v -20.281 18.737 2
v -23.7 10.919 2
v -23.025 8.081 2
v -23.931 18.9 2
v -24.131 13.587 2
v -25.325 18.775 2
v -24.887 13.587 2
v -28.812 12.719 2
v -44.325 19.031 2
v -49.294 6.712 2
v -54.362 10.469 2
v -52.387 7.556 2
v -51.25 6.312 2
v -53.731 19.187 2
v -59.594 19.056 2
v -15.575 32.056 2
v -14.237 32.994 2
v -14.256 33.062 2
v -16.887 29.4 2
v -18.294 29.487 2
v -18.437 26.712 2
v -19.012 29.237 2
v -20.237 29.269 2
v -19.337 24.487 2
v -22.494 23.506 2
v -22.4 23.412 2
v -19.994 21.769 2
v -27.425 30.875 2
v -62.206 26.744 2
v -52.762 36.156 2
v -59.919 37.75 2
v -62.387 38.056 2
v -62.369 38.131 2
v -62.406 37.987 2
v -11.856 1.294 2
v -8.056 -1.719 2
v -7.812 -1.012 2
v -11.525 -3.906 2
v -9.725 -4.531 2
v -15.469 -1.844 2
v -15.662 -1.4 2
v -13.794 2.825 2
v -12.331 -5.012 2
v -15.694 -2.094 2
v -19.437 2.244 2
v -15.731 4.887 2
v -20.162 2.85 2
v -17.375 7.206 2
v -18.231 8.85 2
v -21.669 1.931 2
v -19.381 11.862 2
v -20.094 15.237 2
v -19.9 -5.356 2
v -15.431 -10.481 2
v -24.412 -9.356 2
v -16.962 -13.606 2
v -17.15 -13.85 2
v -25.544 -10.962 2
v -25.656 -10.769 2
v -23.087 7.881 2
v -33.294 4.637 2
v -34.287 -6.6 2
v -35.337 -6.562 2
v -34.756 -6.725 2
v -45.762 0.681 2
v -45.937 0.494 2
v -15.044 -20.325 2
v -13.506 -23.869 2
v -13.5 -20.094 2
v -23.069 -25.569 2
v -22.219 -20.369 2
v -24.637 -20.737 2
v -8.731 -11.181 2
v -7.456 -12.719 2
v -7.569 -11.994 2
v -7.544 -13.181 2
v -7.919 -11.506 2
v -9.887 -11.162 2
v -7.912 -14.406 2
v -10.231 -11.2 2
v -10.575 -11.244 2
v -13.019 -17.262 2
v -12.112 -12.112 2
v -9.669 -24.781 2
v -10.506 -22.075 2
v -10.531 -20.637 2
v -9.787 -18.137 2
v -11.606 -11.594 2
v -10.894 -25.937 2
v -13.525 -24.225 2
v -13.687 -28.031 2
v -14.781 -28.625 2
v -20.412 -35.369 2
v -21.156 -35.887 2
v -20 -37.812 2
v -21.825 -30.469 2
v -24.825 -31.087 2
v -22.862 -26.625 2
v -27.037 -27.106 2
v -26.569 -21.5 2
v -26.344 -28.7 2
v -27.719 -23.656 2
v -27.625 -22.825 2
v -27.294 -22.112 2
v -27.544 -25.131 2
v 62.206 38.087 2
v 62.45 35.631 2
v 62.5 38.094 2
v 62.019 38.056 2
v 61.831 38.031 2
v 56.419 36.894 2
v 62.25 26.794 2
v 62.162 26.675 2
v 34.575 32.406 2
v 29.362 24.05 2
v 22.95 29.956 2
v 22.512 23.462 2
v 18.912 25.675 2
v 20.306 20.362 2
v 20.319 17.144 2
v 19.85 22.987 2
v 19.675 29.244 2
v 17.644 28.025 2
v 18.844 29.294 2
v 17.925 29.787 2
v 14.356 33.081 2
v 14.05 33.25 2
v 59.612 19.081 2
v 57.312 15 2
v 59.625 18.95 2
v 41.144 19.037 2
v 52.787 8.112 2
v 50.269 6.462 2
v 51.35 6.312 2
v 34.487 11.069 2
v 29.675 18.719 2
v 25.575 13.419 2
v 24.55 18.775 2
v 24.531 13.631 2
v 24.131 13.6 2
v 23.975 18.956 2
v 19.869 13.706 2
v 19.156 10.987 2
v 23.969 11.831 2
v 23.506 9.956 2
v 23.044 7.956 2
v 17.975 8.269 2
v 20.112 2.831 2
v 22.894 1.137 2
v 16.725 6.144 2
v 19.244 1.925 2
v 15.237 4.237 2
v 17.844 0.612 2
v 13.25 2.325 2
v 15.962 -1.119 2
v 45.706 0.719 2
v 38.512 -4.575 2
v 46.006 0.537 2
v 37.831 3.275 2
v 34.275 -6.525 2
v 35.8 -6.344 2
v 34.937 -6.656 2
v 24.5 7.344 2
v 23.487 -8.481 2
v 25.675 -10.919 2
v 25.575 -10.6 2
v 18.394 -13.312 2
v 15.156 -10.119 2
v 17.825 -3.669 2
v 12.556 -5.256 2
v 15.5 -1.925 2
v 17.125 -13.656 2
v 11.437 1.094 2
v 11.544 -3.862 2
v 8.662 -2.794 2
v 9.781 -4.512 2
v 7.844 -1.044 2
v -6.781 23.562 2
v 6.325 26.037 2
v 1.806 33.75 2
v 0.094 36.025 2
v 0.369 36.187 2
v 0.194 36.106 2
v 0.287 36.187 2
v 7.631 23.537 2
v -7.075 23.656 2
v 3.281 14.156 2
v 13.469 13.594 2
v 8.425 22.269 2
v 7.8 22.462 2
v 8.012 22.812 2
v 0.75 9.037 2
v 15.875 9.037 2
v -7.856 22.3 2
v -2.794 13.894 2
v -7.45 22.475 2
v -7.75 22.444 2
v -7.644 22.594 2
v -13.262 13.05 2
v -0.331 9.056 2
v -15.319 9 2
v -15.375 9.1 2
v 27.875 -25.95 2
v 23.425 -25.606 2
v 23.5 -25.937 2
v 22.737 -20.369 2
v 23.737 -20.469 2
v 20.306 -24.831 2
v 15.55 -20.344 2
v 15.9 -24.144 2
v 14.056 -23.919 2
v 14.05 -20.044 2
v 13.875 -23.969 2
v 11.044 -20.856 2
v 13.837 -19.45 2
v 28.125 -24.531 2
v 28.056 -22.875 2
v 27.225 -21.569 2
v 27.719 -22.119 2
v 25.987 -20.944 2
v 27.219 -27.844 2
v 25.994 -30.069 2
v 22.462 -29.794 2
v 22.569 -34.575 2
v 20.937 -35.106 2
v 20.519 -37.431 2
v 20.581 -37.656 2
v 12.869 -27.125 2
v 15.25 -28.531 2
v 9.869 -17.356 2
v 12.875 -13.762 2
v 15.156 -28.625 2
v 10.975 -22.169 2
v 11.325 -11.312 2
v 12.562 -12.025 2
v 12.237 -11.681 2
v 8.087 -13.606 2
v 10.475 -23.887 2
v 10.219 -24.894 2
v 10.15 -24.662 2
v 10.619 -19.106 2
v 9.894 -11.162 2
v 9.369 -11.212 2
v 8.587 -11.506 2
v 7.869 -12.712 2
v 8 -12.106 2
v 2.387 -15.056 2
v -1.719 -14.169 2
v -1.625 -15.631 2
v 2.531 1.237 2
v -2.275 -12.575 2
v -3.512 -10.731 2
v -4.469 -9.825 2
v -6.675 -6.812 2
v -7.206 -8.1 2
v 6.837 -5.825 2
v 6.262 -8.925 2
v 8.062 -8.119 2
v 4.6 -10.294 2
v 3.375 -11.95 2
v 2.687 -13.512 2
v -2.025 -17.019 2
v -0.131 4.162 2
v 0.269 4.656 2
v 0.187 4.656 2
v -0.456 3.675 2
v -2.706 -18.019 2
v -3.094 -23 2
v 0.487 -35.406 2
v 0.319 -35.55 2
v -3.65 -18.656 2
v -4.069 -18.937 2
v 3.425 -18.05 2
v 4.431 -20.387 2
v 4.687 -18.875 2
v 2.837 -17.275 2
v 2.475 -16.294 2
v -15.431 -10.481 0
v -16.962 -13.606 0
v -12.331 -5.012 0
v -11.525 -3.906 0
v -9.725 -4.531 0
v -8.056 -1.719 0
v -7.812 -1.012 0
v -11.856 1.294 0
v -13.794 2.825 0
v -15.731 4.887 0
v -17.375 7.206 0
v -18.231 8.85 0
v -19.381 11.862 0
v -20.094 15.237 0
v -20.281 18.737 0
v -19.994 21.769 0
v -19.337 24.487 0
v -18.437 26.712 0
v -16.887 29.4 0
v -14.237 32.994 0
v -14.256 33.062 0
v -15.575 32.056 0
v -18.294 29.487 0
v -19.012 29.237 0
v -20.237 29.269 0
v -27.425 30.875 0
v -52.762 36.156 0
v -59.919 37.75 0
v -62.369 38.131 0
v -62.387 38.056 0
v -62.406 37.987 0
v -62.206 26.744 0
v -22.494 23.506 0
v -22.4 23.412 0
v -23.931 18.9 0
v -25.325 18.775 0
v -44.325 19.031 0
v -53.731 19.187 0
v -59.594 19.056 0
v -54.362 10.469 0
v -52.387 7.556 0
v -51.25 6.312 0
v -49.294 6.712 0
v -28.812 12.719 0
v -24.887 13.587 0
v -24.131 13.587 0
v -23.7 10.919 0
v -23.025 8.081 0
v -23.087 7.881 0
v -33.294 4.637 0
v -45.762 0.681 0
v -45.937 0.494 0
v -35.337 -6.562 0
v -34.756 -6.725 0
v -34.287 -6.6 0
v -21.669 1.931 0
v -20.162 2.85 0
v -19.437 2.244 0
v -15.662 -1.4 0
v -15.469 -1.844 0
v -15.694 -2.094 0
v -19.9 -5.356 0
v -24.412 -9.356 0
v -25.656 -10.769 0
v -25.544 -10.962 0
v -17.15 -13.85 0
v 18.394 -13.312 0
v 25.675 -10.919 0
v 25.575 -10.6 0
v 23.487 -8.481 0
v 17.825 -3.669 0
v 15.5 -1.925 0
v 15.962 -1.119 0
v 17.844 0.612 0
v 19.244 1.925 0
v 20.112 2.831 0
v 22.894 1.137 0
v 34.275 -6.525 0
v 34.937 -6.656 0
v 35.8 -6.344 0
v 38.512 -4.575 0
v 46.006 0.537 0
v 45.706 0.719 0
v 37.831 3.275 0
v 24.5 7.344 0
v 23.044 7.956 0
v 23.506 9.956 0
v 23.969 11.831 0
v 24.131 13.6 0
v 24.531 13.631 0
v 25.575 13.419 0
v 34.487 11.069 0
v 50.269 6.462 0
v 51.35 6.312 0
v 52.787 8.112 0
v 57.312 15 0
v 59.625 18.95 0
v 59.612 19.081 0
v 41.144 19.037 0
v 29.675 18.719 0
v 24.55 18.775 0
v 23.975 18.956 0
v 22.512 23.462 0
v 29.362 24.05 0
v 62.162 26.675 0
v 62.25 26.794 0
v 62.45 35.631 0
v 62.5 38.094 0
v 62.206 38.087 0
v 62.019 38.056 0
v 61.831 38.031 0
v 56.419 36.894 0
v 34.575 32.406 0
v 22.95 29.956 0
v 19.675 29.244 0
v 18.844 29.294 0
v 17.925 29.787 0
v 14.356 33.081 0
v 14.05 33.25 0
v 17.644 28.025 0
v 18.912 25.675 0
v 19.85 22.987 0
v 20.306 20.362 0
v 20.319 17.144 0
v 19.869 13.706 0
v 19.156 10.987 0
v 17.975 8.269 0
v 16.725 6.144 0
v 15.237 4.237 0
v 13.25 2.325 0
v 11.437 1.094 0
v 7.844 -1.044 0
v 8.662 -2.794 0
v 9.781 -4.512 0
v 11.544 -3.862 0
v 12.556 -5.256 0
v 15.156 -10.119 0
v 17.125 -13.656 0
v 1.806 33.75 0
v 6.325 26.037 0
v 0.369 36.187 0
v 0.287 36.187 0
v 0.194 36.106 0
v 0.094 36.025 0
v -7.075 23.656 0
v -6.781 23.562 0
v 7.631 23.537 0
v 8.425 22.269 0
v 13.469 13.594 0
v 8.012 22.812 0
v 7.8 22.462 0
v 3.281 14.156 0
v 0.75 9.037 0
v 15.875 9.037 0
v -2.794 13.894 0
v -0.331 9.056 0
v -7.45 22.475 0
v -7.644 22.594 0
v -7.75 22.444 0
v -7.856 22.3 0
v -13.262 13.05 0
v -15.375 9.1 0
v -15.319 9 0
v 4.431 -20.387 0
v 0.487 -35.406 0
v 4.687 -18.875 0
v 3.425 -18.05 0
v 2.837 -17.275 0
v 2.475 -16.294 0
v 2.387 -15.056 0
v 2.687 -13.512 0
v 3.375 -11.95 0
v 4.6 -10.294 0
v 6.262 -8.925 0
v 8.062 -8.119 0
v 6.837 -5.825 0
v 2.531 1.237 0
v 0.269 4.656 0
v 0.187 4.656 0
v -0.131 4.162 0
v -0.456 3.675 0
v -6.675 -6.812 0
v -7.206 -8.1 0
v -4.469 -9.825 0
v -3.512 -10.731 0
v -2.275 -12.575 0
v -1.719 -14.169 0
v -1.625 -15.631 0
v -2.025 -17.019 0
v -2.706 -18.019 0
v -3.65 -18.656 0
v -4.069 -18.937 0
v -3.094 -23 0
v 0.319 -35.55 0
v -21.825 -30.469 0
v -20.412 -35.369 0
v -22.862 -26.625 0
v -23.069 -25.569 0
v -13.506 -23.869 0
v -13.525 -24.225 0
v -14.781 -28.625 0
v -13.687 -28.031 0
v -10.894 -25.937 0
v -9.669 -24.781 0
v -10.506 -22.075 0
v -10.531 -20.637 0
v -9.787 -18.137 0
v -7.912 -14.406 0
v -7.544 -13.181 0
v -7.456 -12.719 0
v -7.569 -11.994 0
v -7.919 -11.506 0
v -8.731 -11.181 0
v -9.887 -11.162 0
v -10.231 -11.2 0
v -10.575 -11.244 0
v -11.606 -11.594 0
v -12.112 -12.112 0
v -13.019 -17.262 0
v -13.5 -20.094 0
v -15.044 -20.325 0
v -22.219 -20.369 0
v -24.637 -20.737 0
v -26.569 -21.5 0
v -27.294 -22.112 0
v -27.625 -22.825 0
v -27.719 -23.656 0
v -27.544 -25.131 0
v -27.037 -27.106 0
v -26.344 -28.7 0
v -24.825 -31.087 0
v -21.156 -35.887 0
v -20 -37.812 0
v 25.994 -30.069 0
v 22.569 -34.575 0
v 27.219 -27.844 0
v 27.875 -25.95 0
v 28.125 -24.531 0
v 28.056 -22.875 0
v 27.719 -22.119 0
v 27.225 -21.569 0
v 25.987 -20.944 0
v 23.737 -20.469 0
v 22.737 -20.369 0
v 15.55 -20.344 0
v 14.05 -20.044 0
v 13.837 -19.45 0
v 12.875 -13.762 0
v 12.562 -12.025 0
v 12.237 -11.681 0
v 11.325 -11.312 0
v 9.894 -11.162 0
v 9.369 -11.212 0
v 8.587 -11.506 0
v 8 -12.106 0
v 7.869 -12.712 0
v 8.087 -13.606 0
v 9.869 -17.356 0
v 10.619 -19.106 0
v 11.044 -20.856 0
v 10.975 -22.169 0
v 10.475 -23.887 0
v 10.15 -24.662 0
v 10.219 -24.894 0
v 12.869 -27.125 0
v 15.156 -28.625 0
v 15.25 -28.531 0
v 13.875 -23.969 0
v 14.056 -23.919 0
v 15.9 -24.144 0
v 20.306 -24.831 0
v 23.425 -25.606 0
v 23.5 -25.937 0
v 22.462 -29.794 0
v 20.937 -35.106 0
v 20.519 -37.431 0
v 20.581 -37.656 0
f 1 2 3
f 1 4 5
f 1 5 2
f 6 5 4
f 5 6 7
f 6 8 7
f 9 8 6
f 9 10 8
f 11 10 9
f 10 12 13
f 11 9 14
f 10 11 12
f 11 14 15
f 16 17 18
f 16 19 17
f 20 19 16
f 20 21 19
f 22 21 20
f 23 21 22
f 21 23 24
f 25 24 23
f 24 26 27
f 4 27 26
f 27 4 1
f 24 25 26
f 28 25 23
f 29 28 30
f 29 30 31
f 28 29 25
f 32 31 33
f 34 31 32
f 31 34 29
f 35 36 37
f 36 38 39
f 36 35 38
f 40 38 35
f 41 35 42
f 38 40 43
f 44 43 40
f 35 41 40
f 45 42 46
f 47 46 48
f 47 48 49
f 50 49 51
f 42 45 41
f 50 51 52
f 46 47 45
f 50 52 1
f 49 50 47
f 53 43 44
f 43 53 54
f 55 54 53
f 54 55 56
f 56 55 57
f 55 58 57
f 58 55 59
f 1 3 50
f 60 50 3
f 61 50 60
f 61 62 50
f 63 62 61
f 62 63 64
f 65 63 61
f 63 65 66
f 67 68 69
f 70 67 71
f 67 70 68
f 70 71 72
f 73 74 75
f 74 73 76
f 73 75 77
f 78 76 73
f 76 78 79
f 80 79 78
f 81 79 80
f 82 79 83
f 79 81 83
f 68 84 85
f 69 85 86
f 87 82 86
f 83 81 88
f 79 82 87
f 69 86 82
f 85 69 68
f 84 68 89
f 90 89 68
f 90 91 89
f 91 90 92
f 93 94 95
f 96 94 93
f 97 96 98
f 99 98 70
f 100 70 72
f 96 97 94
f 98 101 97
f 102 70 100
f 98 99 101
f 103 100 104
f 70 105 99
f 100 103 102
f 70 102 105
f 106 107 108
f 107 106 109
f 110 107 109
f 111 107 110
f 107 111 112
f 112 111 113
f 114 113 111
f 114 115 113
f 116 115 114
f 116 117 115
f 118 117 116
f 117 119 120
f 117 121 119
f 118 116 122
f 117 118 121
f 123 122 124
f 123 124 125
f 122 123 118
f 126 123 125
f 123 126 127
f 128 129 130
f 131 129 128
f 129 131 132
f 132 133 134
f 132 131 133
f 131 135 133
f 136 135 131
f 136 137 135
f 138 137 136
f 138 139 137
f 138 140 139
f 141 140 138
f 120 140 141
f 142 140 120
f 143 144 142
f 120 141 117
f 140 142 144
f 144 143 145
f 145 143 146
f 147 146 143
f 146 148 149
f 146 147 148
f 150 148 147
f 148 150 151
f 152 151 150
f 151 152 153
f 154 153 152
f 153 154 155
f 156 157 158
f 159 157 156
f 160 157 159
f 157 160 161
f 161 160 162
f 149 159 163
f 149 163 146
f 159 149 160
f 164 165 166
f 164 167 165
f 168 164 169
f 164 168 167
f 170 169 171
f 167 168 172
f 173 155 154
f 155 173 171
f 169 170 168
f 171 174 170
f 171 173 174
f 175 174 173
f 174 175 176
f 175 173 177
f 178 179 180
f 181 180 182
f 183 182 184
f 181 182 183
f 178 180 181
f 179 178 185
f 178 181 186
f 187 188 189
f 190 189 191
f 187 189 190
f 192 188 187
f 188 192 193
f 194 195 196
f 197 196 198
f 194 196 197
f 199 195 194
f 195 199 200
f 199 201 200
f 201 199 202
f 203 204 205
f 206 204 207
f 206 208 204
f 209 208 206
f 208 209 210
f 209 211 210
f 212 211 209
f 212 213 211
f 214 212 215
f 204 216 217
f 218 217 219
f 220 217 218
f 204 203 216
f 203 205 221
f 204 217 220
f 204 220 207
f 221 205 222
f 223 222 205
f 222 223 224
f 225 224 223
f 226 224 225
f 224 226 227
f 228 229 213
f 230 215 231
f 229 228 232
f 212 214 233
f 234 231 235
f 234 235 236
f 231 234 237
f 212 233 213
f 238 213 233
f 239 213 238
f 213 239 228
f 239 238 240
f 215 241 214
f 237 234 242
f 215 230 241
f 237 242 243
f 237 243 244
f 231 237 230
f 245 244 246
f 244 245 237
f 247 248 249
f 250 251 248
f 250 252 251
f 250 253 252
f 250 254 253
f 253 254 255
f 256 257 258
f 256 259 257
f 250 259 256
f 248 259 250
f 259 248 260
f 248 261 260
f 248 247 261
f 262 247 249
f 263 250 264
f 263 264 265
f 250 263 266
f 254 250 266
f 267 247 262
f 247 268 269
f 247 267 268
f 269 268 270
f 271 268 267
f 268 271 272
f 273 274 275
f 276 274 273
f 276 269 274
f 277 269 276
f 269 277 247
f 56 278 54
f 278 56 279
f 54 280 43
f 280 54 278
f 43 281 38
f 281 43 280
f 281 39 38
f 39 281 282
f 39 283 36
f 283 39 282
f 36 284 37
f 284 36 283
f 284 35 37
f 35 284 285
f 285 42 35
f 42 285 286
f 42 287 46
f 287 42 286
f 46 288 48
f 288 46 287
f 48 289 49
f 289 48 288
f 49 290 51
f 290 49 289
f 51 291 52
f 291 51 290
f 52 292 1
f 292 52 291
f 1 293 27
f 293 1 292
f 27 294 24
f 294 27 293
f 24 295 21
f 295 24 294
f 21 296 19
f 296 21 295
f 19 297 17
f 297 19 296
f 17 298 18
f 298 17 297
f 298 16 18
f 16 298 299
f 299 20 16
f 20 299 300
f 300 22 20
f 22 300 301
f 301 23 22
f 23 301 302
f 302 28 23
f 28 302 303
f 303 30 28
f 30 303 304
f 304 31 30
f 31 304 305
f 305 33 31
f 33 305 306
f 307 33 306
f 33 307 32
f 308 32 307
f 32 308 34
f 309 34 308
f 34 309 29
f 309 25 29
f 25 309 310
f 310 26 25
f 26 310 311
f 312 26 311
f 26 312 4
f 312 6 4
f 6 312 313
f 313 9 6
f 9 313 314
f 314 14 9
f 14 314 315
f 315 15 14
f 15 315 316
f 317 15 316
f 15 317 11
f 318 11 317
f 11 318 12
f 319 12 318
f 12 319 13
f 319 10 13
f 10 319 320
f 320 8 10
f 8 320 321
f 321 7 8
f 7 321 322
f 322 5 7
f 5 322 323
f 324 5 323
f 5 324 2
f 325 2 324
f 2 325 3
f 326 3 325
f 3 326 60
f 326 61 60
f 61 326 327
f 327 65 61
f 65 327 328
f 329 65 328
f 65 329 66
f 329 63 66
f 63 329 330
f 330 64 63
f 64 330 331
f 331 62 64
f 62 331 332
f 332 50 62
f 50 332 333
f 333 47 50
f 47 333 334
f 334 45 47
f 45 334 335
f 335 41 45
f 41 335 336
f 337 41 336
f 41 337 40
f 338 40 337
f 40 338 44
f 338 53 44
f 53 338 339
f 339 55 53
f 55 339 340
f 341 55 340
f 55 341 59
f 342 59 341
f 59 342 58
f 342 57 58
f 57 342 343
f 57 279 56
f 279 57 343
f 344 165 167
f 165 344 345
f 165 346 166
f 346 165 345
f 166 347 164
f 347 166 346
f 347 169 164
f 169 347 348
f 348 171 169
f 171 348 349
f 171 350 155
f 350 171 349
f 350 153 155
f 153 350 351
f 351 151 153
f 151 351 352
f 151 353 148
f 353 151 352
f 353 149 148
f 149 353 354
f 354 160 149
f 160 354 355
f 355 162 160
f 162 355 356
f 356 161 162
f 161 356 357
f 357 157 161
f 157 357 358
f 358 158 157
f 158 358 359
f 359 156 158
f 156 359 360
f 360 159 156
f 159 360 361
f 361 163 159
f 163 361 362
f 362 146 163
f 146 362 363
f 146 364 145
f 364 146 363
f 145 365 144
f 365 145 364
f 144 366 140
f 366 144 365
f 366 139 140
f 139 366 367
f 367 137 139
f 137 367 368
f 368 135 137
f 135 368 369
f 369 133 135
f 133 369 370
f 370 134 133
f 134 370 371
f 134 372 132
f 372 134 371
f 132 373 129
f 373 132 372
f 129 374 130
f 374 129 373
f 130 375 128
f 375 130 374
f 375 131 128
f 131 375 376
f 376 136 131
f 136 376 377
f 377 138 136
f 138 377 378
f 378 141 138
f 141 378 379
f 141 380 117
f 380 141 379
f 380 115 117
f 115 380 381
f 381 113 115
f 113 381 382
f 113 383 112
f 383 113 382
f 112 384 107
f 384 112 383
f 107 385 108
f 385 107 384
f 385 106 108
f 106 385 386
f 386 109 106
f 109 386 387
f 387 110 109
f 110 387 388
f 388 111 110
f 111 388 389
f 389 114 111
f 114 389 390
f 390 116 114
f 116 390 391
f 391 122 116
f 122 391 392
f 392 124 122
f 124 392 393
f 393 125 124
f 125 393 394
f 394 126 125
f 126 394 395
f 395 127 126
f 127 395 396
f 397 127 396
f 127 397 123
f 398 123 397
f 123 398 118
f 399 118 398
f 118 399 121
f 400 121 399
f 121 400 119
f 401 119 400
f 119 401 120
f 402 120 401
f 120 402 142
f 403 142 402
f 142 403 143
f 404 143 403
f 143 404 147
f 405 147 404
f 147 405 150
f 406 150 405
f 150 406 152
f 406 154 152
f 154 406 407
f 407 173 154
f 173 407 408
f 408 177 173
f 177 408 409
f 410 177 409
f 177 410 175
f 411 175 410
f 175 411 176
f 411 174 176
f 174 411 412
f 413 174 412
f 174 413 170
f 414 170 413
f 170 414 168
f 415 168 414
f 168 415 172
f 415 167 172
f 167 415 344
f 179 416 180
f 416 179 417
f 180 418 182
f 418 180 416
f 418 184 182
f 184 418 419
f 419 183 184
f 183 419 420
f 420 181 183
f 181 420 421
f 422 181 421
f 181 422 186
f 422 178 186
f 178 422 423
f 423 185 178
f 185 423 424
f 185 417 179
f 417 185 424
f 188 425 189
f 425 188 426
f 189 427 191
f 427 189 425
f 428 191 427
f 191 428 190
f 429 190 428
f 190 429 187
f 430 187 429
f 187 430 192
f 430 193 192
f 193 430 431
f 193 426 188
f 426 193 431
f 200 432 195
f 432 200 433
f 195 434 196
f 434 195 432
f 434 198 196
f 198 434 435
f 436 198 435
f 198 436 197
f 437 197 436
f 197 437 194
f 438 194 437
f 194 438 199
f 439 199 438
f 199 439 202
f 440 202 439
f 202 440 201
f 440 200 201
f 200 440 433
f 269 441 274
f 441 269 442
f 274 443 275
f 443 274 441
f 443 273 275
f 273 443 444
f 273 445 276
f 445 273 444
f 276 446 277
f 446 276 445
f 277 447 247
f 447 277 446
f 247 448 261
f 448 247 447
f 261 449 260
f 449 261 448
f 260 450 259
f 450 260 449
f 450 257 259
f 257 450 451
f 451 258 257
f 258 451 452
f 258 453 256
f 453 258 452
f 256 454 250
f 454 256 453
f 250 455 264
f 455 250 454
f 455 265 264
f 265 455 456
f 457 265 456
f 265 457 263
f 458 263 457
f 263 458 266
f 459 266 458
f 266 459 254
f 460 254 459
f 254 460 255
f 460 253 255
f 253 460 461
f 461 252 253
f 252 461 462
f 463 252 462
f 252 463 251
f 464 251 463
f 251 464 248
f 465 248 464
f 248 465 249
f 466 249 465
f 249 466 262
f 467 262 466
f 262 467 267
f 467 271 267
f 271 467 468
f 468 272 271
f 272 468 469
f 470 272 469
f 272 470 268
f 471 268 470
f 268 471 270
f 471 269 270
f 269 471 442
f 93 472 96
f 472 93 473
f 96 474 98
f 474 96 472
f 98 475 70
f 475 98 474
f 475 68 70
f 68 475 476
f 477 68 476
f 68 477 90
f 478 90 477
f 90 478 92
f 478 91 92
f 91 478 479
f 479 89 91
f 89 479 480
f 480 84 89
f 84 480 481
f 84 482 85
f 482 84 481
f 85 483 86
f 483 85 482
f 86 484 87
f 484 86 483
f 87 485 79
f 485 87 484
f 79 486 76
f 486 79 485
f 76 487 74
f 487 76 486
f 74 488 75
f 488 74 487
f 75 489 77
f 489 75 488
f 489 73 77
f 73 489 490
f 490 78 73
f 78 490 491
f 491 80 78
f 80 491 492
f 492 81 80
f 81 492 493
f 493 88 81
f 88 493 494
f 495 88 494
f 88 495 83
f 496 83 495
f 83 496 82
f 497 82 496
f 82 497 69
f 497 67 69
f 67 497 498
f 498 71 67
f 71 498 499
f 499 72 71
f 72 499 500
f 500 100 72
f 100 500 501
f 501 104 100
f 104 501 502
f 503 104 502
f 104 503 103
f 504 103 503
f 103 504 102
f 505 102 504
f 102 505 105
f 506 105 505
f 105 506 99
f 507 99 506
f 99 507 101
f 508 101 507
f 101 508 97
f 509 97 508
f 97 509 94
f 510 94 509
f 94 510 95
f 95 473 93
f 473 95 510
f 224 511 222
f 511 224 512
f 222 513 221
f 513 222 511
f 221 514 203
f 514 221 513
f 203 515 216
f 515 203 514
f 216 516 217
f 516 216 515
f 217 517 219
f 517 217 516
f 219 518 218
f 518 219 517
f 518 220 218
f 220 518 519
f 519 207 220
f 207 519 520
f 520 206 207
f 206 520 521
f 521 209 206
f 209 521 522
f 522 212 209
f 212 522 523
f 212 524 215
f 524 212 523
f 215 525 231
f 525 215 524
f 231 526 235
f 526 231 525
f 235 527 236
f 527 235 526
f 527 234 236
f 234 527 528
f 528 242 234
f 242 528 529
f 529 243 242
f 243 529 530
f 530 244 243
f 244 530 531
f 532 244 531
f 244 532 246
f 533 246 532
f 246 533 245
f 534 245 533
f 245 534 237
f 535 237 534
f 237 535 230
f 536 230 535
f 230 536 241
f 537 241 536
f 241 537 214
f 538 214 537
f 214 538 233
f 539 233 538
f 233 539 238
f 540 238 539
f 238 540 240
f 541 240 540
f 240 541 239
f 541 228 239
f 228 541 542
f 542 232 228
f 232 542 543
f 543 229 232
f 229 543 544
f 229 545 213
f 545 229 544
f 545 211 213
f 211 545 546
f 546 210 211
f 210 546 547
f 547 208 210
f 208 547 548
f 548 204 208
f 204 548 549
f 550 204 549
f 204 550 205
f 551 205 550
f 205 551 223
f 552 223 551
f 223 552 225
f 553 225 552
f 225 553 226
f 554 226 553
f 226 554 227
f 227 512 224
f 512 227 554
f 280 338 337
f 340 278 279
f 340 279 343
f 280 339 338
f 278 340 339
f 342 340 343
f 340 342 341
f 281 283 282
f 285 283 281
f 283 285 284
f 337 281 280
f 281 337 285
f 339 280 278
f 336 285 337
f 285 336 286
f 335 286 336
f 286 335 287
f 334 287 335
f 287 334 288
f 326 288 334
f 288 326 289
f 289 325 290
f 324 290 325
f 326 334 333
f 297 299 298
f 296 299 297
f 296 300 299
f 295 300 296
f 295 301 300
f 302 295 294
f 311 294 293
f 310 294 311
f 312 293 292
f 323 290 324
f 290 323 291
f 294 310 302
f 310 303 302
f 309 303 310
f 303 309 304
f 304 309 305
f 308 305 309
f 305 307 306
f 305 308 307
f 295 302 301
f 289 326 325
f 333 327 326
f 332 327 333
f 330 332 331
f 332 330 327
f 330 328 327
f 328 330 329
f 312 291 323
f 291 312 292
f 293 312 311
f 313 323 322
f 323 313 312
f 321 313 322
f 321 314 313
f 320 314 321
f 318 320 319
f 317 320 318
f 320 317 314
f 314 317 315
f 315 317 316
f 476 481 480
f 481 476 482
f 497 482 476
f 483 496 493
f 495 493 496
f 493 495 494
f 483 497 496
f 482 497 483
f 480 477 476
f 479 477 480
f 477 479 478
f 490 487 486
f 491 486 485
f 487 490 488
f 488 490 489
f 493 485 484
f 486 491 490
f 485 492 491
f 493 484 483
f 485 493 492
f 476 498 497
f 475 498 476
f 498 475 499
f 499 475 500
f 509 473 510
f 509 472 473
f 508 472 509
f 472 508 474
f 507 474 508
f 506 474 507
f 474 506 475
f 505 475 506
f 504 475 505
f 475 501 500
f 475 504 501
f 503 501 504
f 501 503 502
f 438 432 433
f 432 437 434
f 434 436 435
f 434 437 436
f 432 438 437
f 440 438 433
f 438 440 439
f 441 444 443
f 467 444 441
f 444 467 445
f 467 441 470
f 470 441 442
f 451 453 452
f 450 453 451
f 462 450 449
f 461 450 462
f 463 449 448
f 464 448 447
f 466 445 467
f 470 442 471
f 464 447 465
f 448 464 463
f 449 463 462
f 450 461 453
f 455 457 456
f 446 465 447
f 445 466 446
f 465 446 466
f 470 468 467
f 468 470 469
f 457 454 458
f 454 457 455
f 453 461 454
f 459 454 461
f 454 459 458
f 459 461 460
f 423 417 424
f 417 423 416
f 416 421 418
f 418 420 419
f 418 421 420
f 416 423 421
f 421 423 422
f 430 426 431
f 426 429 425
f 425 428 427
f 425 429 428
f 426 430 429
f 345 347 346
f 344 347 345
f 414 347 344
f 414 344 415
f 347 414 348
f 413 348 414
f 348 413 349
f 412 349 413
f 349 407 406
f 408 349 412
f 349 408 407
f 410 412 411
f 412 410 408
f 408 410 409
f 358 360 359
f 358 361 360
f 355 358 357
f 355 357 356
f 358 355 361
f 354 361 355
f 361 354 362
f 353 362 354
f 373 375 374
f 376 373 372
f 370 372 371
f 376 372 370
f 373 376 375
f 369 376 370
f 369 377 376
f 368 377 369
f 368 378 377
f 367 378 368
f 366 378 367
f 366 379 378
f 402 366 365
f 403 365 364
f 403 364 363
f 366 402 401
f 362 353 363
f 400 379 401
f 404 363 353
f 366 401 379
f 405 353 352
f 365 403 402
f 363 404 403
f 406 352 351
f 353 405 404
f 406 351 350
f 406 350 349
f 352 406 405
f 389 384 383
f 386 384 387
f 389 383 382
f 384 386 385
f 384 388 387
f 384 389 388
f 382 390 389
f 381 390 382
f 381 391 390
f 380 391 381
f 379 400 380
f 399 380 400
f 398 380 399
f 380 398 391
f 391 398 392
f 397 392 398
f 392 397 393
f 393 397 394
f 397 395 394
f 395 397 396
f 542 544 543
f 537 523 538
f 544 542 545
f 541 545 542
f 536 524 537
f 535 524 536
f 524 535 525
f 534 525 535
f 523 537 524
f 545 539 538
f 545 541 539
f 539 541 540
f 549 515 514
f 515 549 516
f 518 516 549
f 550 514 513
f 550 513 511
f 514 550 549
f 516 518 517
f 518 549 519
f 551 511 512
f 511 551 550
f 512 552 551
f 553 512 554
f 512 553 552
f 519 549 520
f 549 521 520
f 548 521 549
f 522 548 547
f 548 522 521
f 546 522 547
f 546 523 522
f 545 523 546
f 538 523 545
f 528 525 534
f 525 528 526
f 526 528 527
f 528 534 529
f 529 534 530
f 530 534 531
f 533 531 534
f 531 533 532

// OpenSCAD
module 1718379385fcc7b6d36b695bde47f440_1()
{
 /* Generated by trace2scad version 20150415
    http://aggregate.org/MAKE/TRACE2SCAD/
    Optimized model has 279/3844 original points
 */
 color([0.48, 0.48, 0.48])
 assign(minx=0) /* polygon minx=15 */
 assign(miny=0) /* polygon miny=75 */
 assign(maxx=20000) /* polygon maxx=20000 */
 assign(maxy=12250) /* polygon maxy=12226 */
 assign(dx=maxx-minx)
 assign(dy=maxy-miny)
 assign(maxd=((dx>dy)?dx:dy))
 scale([1/maxd, 1/maxd, 1])
 translate([-minx-dx/2, -miny-dy/2, 0])
 linear_extrude(height=1, convexity=279)
 union() {
  union() {
   polygon([[18,12214],[15,12203],[47,10404],[6401,9886],[6416,9871],[6171,9149],[5948,9129],[2908,9170],[1403,9195],[465,9174],[1302,7800],[1618,7334],[1800,7135],[2113,7199],[5390,8160],[6018,8299],[6139,8299],[6208,7872],[6316,7418],[6306,7386],[4673,6867],[2678,6234],[2650,6204],[4346,5075],[4439,5049],[4514,5069],[6533,6434],[6774,6581],[6890,6484],[7494,5901],[7525,5830],[7489,5790],[6816,5268],[6094,4628],[5895,4402],[5913,4371],[7256,3909],[7286,3948],[7531,4448],[8027,5323],[8156,5500],[8444,5400],[8711,5850],[8750,5963],[8103,6332],[7793,6577],[7483,6907],[7220,7278],[7083,7541],[6899,8023],[6785,8563],[6755,9123],[6801,9608],[6906,10043],[7050,10399],[7298,10829],[7722,11404],[7719,11415],[7508,11254],[7073,10843],[6958,10803],[6762,10808],[5612,11065],[1558,11910],[413,12165],[21,12226]], convexity=24);
   polygon([[19923,12214],[19893,12210],[19027,12028],[15532,11310],[13672,10918],[13148,10804],[13015,10812],[12868,10891],[12297,11418],[12248,11445],[12823,10609],[13026,10233],[13176,9803],[13249,9383],[13251,8868],[13179,8318],[13065,7883],[12876,7448],[12676,7108],[12438,6803],[12120,6497],[11830,6300],[11255,5958],[11386,5678],[11565,5403],[11847,5507],[12009,5284],[12425,4506],[12740,3940],[12943,3995],[14108,4378],[14092,4429],[13758,4768],[12852,5538],[12480,5817],[12554,5946],[12855,6223],[13079,6433],[13218,6578],[13663,6307],[15484,5081],[15590,5060],[15728,5110],[16162,5393],[17361,6211],[17313,6240],[16053,6649],[13920,7300],[13687,7398],[13761,7718],[13835,8018],[13861,8301],[13925,8306],[14092,8272],[15518,7896],[18043,7159],[18216,7135],[18446,7423],[19170,8525],[19540,9157],[19538,9178],[16583,9171],[14748,9120],[13928,9129],[13836,9158],[13602,9879],[14698,9973],[19946,10393],[19960,10412],[19992,11826],[20000,12220],[19953,12219]], convexity=23);
   polygon([[10031,11902],[10015,11889],[8868,9910],[8915,9895],[11221,9891],[11012,10291],[10289,11525],[10059,11915],[10046,11915]], convexity=5);
   polygon([[11265,9747],[11248,9719],[10525,8390],[10120,7571],[12540,7571],[12155,8300],[11348,9688],[11282,9775]], convexity=5);
   polygon([[8760,9716],[8743,9693],[7878,8213],[7540,7581],[7549,7565],[9947,7574],[9553,8348],[8808,9721],[8777,9740]], convexity=6);
   polygon([[9979,6791],[9927,6713],[8932,5035],[8847,4829],[9285,4553],[9438,4408],[9636,4113],[9725,3858],[9740,3624],[9676,3402],[9567,3242],[9416,3140],[9349,3095],[9505,2445],[10051,437],[10078,460],[10709,2863],[10750,3105],[10548,3237],[10454,3361],[10396,3518],[10382,3716],[10430,3963],[10540,4213],[10736,4478],[11002,4697],[11290,4826],[11094,5193],[10405,6323],[10043,6870],[10030,6870]], convexity=10);
   polygon([[8363,4333],[8308,4326],[8143,4270],[8062,4187],[7917,3363],[7840,2910],[7593,2873],[6445,2866],[6058,2807],[5749,2685],[5633,2587],[5580,2473],[5565,2340],[5593,2104],[5674,1788],[5785,1533],[6028,1151],[6615,383],[6800,75],[6734,466],[6508,1250],[6342,1865],[6309,2034],[7839,2306],[7836,2249],[7635,1545],[7810,1640],[8257,1975],[8453,2160],[8319,2593],[8315,2823],[8434,3223],[8734,3820],[8793,4016],[8807,4090],[8789,4206],[8733,4284],[8603,4336],[8418,4339]], convexity=11);
   polygon([[11541,4335],[11499,4331],[11374,4284],[11280,4188],[11259,4091],[11294,3948],[11579,3348],[11699,3068],[11767,2788],[11756,2578],[11676,2303],[11624,2179],[11635,2142],[12059,1785],[12425,1545],[12440,1560],[12220,2290],[12249,2298],[12544,2262],[13249,2152],[13748,2028],[13760,1975],[13594,1358],[13350,508],[13283,136],[13293,100],[13611,593],[14159,1314],[14355,1670],[14460,1973],[14500,2200],[14489,2465],[14435,2586],[14356,2674],[14158,2774],[13798,2850],[13638,2866],[12488,2870],[12248,2918],[12214,3013],[12060,3923],[12010,4201],[11958,4256],[11812,4315],[11583,4339]], convexity=14);
  }
 }
}

module 1718379385fcc7b6d36b695bde47f440()
{
 /* all layers combined, scaled to within a 1mm cube */
 scale([1, 1, 1/1])
 difference() {
  union() {
   scale([1,1,2]) translate([0,0,-0.5]) 1718379385fcc7b6d36b695bde47f440_1();
  }
  translate([0,0,-2]) cube([2,2,4],center=true);
 }
}

scale([125, 125, 2]) {
	1718379385fcc7b6d36b695bde47f440();
}
